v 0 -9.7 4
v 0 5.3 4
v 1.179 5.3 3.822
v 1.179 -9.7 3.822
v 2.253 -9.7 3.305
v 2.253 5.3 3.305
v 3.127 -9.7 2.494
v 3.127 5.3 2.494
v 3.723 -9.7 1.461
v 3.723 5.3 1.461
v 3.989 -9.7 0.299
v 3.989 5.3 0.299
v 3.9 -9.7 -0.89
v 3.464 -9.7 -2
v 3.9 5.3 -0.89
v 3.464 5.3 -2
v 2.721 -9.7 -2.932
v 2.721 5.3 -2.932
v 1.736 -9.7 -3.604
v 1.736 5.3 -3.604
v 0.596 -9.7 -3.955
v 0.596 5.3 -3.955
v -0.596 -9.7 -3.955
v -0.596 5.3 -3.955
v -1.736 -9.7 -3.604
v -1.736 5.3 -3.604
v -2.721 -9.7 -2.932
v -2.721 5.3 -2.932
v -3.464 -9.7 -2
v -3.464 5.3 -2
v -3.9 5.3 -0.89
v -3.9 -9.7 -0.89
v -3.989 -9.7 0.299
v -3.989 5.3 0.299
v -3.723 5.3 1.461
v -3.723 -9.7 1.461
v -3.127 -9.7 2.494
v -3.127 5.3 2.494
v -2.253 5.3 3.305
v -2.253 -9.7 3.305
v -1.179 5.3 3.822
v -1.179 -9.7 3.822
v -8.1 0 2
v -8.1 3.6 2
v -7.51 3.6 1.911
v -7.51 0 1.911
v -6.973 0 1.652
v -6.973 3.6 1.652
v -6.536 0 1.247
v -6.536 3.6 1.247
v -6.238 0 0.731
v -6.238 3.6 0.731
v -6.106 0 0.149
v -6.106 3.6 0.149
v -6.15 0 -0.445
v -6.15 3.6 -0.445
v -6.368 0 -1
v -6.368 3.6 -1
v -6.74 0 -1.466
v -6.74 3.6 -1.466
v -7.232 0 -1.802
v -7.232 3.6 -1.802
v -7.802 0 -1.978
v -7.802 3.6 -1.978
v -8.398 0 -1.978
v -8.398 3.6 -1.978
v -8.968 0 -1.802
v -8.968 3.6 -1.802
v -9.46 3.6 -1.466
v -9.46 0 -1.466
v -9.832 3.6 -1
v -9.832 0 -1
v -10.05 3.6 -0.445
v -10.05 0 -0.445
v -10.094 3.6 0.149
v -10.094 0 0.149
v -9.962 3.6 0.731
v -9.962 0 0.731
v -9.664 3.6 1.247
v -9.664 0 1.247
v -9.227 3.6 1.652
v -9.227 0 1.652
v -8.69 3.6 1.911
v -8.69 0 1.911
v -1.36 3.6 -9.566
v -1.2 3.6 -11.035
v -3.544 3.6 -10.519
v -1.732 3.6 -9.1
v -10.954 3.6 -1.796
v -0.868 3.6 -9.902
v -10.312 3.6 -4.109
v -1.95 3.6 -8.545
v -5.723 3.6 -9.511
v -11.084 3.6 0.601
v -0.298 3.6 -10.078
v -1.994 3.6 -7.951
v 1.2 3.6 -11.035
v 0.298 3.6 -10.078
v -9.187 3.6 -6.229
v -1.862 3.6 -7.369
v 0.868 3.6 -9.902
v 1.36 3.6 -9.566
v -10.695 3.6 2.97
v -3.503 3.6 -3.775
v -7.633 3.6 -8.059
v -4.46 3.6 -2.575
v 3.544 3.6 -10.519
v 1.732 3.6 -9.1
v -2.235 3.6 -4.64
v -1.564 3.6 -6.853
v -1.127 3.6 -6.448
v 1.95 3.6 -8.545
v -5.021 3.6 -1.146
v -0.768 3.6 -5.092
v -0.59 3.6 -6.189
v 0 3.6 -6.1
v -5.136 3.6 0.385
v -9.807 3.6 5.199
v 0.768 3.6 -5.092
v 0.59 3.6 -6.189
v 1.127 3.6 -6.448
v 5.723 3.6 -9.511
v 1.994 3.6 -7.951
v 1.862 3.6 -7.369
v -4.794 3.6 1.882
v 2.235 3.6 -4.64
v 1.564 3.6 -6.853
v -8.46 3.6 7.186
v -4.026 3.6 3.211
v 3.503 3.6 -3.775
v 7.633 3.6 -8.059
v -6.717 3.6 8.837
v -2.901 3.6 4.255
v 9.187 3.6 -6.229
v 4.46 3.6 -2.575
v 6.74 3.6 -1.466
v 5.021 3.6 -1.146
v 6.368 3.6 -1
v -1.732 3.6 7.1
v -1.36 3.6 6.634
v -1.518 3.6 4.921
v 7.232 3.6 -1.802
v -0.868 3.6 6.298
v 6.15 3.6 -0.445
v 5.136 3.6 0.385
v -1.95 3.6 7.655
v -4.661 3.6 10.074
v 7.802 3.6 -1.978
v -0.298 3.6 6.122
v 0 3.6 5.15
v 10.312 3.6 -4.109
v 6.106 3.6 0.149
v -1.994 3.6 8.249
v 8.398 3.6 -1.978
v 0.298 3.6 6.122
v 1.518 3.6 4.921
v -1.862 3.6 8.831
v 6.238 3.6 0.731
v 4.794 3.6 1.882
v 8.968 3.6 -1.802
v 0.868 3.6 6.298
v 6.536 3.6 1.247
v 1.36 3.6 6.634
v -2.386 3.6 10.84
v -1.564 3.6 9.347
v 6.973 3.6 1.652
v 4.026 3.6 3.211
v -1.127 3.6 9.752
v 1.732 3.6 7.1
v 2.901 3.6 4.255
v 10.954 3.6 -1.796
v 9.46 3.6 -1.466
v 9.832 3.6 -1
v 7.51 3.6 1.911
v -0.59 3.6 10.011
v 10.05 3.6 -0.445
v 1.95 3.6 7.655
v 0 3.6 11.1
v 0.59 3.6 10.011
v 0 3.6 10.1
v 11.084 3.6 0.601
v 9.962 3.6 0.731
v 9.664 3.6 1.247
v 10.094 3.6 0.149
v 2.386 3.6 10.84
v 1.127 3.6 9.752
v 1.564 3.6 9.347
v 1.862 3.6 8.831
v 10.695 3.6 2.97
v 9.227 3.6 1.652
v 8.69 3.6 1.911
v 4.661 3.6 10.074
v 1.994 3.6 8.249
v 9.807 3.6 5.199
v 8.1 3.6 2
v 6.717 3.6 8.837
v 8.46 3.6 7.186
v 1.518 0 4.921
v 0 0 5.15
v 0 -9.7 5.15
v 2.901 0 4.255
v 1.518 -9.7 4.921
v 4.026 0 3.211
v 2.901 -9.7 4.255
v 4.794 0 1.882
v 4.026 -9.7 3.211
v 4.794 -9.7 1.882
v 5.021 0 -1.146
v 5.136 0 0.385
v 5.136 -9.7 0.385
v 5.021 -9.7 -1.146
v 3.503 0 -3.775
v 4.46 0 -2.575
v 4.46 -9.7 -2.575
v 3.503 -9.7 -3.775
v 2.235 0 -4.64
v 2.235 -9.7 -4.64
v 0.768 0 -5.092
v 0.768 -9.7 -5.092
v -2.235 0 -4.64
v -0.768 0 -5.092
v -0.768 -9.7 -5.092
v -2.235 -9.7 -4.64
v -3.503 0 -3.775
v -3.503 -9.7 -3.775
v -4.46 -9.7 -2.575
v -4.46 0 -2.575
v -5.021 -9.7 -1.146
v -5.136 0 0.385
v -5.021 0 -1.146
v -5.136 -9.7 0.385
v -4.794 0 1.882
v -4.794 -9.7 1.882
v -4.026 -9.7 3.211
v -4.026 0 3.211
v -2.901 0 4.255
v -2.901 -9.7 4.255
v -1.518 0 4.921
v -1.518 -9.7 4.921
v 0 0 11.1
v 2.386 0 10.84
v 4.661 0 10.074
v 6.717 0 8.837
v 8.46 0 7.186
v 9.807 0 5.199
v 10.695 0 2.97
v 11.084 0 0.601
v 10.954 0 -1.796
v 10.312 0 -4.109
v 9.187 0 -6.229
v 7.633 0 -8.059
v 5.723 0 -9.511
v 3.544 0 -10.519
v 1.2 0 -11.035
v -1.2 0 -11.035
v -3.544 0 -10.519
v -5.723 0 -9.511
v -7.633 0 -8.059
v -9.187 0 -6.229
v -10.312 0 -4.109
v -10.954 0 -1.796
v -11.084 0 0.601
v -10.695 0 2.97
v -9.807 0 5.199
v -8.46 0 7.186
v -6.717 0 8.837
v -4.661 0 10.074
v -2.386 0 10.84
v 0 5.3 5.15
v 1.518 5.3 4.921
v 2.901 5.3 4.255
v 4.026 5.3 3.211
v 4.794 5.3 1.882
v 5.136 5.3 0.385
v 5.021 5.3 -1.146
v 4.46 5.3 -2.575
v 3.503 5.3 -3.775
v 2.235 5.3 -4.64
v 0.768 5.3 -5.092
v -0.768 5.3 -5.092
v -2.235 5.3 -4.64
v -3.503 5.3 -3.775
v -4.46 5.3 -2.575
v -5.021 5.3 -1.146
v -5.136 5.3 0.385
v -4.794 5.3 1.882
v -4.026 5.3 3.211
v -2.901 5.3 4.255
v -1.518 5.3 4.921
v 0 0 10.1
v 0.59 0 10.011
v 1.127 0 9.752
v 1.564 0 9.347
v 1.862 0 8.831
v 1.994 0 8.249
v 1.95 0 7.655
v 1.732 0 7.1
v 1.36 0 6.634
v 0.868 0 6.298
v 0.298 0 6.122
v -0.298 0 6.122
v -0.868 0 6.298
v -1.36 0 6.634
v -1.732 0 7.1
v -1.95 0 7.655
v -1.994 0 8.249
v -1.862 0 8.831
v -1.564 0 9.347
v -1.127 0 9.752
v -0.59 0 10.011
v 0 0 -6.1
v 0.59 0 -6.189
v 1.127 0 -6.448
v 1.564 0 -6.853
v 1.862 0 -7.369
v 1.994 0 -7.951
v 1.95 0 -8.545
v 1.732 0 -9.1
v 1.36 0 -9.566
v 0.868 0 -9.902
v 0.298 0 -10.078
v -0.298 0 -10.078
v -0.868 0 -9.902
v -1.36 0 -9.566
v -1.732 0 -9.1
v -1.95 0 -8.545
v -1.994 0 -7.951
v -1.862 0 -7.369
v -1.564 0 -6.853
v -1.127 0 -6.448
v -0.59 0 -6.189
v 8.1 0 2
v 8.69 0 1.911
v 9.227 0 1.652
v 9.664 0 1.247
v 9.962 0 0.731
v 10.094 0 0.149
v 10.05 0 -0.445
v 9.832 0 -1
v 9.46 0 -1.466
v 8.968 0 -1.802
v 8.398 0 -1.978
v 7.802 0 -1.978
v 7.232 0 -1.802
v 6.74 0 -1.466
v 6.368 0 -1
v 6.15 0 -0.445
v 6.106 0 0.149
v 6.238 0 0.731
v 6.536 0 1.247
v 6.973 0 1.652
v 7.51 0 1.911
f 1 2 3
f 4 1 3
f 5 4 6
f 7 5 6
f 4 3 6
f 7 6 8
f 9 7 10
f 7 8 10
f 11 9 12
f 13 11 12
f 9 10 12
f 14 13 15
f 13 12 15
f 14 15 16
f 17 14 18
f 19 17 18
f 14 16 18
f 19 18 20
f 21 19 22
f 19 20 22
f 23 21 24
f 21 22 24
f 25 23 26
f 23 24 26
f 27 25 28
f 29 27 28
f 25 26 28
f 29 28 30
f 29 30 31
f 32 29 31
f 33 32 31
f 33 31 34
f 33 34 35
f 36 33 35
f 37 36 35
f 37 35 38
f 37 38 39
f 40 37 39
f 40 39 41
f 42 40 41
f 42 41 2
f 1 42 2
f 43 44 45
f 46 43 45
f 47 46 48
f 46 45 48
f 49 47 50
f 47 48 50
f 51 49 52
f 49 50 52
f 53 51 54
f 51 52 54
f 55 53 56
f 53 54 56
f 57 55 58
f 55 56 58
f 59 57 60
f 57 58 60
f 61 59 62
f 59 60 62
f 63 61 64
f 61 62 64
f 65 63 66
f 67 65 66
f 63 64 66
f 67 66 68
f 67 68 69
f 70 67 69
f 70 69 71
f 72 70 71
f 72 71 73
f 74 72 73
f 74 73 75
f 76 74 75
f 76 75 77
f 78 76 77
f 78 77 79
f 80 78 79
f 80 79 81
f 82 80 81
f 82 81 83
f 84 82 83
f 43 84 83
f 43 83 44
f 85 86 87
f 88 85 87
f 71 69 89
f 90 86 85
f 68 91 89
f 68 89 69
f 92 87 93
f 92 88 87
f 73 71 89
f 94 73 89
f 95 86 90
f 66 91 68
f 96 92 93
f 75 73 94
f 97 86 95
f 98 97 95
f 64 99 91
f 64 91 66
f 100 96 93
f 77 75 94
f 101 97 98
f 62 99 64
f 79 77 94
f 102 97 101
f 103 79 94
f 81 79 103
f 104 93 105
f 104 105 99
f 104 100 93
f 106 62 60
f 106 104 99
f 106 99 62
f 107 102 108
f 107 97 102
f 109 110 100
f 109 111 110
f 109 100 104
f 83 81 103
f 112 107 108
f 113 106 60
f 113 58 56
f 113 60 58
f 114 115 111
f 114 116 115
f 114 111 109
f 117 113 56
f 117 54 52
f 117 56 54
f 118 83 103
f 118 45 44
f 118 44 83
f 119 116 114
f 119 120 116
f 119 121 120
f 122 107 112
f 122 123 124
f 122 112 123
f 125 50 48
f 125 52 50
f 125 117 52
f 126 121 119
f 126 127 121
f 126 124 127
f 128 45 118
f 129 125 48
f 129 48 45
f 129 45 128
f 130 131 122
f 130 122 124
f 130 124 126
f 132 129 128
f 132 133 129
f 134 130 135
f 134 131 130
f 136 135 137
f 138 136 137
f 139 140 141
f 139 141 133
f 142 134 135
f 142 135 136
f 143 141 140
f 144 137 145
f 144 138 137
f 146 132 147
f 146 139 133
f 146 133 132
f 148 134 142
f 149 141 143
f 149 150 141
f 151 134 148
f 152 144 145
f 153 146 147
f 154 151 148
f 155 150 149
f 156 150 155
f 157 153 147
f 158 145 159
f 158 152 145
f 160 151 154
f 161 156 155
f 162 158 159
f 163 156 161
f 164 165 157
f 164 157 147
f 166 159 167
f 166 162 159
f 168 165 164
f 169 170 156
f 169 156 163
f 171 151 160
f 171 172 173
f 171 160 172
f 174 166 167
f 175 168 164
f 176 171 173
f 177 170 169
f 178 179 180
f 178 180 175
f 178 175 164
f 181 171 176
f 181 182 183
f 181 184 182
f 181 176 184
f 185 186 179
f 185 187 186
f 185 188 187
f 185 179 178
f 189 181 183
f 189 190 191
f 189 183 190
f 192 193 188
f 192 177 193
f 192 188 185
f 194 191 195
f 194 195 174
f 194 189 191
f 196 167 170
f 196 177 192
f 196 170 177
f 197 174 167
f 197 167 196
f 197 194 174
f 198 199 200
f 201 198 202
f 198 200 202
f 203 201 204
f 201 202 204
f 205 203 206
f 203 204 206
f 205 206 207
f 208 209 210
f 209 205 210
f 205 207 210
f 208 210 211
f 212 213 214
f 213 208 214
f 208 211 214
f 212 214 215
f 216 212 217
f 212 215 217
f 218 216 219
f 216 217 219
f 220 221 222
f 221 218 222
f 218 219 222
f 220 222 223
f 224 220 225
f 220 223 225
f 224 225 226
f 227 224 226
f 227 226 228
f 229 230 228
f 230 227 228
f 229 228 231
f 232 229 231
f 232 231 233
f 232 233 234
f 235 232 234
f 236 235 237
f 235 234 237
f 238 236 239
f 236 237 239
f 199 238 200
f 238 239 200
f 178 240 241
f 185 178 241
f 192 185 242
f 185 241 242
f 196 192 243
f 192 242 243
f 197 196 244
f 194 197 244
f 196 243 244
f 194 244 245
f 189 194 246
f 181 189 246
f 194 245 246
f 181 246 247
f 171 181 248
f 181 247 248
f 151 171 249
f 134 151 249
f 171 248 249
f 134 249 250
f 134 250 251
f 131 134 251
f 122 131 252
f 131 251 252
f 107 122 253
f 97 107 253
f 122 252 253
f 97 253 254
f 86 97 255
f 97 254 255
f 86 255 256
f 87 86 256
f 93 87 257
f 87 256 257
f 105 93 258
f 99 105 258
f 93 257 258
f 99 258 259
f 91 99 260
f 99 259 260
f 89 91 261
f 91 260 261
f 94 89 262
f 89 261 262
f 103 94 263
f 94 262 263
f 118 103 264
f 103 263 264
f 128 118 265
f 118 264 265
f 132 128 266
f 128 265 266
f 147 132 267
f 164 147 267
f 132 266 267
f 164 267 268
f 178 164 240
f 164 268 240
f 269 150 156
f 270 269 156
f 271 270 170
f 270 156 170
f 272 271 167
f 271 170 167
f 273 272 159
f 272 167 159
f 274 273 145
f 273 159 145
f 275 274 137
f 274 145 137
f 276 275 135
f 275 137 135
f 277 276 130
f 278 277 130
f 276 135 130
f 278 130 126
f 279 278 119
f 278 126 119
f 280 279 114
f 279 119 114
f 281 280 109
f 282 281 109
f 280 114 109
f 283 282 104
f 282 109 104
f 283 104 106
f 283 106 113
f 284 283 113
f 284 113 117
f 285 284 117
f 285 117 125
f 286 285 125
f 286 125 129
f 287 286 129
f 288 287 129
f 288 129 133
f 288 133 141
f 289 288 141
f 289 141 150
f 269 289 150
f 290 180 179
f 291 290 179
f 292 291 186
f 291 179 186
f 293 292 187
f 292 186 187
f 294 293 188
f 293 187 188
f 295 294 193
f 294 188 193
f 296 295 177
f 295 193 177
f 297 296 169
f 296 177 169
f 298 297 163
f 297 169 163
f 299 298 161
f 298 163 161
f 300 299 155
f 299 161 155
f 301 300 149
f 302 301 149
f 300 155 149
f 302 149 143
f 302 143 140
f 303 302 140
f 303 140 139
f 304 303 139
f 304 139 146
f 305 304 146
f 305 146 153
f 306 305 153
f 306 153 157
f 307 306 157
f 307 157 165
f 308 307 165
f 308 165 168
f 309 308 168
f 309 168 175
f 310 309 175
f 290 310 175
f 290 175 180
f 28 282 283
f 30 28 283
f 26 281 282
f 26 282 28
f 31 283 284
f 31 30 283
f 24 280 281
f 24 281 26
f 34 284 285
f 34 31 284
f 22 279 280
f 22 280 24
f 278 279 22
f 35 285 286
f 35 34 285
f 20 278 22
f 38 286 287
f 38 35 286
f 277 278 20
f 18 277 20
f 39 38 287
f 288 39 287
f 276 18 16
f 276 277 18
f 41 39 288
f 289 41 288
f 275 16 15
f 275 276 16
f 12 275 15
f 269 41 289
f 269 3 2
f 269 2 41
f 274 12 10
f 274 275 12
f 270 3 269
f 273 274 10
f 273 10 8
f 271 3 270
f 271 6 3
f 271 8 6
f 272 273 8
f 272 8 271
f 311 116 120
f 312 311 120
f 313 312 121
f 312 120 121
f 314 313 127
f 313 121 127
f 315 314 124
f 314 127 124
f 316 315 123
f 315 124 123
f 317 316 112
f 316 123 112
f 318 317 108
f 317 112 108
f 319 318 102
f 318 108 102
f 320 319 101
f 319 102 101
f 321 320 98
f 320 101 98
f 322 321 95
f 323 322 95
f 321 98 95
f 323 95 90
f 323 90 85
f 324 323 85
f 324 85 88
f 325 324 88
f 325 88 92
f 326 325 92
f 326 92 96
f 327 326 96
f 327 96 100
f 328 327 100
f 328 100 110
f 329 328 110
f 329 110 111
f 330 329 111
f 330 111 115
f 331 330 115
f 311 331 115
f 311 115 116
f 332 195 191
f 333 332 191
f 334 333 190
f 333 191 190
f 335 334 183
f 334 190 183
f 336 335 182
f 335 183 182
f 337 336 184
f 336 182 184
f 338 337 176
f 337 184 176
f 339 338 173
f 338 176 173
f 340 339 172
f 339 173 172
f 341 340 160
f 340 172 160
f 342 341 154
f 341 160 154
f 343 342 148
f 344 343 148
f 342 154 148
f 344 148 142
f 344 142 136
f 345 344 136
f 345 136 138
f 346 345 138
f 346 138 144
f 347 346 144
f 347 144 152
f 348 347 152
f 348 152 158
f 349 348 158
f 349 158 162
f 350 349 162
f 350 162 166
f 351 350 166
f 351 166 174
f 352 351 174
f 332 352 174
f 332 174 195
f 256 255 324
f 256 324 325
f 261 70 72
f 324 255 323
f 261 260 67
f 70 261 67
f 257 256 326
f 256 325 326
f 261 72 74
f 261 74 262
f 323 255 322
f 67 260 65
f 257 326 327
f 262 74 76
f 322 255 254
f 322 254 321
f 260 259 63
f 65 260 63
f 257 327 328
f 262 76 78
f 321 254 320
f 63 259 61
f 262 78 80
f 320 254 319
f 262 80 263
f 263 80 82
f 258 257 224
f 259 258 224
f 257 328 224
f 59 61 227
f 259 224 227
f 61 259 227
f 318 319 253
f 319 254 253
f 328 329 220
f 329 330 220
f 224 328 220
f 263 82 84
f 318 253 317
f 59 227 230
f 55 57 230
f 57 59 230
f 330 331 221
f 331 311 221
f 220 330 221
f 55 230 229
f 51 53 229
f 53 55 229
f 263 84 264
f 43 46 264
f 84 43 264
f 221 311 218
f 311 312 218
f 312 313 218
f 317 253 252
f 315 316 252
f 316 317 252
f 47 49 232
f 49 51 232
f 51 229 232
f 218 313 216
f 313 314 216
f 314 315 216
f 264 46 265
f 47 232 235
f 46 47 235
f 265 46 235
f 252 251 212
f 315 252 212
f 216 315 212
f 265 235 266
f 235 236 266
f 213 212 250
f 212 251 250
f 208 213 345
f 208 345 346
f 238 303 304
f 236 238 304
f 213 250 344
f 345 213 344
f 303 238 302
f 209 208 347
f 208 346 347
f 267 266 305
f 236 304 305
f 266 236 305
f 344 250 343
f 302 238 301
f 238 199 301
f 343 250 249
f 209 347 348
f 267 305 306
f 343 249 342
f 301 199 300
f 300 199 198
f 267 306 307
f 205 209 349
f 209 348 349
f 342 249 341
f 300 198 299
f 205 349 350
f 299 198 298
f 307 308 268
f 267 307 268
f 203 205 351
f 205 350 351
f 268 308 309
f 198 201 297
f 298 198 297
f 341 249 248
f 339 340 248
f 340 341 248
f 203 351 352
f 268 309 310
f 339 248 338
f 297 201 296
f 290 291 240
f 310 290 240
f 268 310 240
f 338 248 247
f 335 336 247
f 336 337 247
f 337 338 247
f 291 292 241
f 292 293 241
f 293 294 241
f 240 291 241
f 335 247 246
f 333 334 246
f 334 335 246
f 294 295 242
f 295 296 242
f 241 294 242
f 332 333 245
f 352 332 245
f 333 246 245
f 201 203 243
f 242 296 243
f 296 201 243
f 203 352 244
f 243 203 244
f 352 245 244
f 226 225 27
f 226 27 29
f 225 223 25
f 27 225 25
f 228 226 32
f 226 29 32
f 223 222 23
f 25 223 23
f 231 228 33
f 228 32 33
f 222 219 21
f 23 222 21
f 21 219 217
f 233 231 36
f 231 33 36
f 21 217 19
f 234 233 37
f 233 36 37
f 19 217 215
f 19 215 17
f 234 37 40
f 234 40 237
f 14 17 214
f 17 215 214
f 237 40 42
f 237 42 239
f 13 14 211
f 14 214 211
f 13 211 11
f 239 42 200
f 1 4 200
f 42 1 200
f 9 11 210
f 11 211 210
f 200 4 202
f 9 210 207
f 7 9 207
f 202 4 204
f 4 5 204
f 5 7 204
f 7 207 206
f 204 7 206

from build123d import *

# Parameters (mm, degrees)
SKETCH1_R                = 11.1
BOSS_EXTRUDE1_DEPTH      = 3.6
BOSS_EXTRUDE2_DEPTH      = 1.7
BOSS_EXTRUDE2_DEPTH_BACK = 13.3
SKETCH2_R                = 5.15
SKETCH3_R                = 4
SKETCH3_R_2              = 2
CUT_EXTRUDE1_DEPTH       = 22.712208547


with BuildPart() as part:
    # Sketch1 → Boss-Extrude1 (new body)
    with BuildSketch(Plane(origin=(0, 0, 0), x_dir=(1, 0, 0), z_dir=(0, 1, 0))):
        with Locations(Location((0, 0, 0), (0, 0, 270))):
            Circle(SKETCH1_R)
    extrude(amount=BOSS_EXTRUDE1_DEPTH)

    # Sketch2 → Boss-Extrude2 (add, two sides: drawn at the far end of the back side and taken through both)
    with BuildSketch(Plane(origin=(0, 3.6, 0), x_dir=(1, 0, 0), z_dir=(0, 1, 0)).offset(-BOSS_EXTRUDE2_DEPTH_BACK)):
        with Locations(Location((0, 0, 0), (0, 0, 270))):
            Circle(SKETCH2_R)
    extrude(amount=BOSS_EXTRUDE2_DEPTH + BOSS_EXTRUDE2_DEPTH_BACK)

    # Sketch3 → Cut-Extrude1 (cut, through all)
    with BuildSketch(Plane(origin=(0, 5.3, 0), x_dir=(1, 0, 0), z_dir=(0, 1, 0))):
        with Locations(Location((0, 0, 0), (0, 0, 270))):
            Circle(SKETCH3_R)
        with Locations(Location((-8.1, 0, 0), (0, 0, 270))):
            Circle(SKETCH3_R_2)
        with Locations(Location((8.1, 0, 0), (0, 0, 270))):
            Circle(SKETCH3_R_2)
        with Locations(Location((0, 8.1, 0), (0, 0, 270))):
            Circle(SKETCH3_R_2)
        with Locations(Location((0, -8.1, 0), (0, 0, 270))):
            Circle(SKETCH3_R_2)
    extrude(amount=-CUT_EXTRUDE1_DEPTH, mode=Mode.SUBTRACT)


solid = part.part
